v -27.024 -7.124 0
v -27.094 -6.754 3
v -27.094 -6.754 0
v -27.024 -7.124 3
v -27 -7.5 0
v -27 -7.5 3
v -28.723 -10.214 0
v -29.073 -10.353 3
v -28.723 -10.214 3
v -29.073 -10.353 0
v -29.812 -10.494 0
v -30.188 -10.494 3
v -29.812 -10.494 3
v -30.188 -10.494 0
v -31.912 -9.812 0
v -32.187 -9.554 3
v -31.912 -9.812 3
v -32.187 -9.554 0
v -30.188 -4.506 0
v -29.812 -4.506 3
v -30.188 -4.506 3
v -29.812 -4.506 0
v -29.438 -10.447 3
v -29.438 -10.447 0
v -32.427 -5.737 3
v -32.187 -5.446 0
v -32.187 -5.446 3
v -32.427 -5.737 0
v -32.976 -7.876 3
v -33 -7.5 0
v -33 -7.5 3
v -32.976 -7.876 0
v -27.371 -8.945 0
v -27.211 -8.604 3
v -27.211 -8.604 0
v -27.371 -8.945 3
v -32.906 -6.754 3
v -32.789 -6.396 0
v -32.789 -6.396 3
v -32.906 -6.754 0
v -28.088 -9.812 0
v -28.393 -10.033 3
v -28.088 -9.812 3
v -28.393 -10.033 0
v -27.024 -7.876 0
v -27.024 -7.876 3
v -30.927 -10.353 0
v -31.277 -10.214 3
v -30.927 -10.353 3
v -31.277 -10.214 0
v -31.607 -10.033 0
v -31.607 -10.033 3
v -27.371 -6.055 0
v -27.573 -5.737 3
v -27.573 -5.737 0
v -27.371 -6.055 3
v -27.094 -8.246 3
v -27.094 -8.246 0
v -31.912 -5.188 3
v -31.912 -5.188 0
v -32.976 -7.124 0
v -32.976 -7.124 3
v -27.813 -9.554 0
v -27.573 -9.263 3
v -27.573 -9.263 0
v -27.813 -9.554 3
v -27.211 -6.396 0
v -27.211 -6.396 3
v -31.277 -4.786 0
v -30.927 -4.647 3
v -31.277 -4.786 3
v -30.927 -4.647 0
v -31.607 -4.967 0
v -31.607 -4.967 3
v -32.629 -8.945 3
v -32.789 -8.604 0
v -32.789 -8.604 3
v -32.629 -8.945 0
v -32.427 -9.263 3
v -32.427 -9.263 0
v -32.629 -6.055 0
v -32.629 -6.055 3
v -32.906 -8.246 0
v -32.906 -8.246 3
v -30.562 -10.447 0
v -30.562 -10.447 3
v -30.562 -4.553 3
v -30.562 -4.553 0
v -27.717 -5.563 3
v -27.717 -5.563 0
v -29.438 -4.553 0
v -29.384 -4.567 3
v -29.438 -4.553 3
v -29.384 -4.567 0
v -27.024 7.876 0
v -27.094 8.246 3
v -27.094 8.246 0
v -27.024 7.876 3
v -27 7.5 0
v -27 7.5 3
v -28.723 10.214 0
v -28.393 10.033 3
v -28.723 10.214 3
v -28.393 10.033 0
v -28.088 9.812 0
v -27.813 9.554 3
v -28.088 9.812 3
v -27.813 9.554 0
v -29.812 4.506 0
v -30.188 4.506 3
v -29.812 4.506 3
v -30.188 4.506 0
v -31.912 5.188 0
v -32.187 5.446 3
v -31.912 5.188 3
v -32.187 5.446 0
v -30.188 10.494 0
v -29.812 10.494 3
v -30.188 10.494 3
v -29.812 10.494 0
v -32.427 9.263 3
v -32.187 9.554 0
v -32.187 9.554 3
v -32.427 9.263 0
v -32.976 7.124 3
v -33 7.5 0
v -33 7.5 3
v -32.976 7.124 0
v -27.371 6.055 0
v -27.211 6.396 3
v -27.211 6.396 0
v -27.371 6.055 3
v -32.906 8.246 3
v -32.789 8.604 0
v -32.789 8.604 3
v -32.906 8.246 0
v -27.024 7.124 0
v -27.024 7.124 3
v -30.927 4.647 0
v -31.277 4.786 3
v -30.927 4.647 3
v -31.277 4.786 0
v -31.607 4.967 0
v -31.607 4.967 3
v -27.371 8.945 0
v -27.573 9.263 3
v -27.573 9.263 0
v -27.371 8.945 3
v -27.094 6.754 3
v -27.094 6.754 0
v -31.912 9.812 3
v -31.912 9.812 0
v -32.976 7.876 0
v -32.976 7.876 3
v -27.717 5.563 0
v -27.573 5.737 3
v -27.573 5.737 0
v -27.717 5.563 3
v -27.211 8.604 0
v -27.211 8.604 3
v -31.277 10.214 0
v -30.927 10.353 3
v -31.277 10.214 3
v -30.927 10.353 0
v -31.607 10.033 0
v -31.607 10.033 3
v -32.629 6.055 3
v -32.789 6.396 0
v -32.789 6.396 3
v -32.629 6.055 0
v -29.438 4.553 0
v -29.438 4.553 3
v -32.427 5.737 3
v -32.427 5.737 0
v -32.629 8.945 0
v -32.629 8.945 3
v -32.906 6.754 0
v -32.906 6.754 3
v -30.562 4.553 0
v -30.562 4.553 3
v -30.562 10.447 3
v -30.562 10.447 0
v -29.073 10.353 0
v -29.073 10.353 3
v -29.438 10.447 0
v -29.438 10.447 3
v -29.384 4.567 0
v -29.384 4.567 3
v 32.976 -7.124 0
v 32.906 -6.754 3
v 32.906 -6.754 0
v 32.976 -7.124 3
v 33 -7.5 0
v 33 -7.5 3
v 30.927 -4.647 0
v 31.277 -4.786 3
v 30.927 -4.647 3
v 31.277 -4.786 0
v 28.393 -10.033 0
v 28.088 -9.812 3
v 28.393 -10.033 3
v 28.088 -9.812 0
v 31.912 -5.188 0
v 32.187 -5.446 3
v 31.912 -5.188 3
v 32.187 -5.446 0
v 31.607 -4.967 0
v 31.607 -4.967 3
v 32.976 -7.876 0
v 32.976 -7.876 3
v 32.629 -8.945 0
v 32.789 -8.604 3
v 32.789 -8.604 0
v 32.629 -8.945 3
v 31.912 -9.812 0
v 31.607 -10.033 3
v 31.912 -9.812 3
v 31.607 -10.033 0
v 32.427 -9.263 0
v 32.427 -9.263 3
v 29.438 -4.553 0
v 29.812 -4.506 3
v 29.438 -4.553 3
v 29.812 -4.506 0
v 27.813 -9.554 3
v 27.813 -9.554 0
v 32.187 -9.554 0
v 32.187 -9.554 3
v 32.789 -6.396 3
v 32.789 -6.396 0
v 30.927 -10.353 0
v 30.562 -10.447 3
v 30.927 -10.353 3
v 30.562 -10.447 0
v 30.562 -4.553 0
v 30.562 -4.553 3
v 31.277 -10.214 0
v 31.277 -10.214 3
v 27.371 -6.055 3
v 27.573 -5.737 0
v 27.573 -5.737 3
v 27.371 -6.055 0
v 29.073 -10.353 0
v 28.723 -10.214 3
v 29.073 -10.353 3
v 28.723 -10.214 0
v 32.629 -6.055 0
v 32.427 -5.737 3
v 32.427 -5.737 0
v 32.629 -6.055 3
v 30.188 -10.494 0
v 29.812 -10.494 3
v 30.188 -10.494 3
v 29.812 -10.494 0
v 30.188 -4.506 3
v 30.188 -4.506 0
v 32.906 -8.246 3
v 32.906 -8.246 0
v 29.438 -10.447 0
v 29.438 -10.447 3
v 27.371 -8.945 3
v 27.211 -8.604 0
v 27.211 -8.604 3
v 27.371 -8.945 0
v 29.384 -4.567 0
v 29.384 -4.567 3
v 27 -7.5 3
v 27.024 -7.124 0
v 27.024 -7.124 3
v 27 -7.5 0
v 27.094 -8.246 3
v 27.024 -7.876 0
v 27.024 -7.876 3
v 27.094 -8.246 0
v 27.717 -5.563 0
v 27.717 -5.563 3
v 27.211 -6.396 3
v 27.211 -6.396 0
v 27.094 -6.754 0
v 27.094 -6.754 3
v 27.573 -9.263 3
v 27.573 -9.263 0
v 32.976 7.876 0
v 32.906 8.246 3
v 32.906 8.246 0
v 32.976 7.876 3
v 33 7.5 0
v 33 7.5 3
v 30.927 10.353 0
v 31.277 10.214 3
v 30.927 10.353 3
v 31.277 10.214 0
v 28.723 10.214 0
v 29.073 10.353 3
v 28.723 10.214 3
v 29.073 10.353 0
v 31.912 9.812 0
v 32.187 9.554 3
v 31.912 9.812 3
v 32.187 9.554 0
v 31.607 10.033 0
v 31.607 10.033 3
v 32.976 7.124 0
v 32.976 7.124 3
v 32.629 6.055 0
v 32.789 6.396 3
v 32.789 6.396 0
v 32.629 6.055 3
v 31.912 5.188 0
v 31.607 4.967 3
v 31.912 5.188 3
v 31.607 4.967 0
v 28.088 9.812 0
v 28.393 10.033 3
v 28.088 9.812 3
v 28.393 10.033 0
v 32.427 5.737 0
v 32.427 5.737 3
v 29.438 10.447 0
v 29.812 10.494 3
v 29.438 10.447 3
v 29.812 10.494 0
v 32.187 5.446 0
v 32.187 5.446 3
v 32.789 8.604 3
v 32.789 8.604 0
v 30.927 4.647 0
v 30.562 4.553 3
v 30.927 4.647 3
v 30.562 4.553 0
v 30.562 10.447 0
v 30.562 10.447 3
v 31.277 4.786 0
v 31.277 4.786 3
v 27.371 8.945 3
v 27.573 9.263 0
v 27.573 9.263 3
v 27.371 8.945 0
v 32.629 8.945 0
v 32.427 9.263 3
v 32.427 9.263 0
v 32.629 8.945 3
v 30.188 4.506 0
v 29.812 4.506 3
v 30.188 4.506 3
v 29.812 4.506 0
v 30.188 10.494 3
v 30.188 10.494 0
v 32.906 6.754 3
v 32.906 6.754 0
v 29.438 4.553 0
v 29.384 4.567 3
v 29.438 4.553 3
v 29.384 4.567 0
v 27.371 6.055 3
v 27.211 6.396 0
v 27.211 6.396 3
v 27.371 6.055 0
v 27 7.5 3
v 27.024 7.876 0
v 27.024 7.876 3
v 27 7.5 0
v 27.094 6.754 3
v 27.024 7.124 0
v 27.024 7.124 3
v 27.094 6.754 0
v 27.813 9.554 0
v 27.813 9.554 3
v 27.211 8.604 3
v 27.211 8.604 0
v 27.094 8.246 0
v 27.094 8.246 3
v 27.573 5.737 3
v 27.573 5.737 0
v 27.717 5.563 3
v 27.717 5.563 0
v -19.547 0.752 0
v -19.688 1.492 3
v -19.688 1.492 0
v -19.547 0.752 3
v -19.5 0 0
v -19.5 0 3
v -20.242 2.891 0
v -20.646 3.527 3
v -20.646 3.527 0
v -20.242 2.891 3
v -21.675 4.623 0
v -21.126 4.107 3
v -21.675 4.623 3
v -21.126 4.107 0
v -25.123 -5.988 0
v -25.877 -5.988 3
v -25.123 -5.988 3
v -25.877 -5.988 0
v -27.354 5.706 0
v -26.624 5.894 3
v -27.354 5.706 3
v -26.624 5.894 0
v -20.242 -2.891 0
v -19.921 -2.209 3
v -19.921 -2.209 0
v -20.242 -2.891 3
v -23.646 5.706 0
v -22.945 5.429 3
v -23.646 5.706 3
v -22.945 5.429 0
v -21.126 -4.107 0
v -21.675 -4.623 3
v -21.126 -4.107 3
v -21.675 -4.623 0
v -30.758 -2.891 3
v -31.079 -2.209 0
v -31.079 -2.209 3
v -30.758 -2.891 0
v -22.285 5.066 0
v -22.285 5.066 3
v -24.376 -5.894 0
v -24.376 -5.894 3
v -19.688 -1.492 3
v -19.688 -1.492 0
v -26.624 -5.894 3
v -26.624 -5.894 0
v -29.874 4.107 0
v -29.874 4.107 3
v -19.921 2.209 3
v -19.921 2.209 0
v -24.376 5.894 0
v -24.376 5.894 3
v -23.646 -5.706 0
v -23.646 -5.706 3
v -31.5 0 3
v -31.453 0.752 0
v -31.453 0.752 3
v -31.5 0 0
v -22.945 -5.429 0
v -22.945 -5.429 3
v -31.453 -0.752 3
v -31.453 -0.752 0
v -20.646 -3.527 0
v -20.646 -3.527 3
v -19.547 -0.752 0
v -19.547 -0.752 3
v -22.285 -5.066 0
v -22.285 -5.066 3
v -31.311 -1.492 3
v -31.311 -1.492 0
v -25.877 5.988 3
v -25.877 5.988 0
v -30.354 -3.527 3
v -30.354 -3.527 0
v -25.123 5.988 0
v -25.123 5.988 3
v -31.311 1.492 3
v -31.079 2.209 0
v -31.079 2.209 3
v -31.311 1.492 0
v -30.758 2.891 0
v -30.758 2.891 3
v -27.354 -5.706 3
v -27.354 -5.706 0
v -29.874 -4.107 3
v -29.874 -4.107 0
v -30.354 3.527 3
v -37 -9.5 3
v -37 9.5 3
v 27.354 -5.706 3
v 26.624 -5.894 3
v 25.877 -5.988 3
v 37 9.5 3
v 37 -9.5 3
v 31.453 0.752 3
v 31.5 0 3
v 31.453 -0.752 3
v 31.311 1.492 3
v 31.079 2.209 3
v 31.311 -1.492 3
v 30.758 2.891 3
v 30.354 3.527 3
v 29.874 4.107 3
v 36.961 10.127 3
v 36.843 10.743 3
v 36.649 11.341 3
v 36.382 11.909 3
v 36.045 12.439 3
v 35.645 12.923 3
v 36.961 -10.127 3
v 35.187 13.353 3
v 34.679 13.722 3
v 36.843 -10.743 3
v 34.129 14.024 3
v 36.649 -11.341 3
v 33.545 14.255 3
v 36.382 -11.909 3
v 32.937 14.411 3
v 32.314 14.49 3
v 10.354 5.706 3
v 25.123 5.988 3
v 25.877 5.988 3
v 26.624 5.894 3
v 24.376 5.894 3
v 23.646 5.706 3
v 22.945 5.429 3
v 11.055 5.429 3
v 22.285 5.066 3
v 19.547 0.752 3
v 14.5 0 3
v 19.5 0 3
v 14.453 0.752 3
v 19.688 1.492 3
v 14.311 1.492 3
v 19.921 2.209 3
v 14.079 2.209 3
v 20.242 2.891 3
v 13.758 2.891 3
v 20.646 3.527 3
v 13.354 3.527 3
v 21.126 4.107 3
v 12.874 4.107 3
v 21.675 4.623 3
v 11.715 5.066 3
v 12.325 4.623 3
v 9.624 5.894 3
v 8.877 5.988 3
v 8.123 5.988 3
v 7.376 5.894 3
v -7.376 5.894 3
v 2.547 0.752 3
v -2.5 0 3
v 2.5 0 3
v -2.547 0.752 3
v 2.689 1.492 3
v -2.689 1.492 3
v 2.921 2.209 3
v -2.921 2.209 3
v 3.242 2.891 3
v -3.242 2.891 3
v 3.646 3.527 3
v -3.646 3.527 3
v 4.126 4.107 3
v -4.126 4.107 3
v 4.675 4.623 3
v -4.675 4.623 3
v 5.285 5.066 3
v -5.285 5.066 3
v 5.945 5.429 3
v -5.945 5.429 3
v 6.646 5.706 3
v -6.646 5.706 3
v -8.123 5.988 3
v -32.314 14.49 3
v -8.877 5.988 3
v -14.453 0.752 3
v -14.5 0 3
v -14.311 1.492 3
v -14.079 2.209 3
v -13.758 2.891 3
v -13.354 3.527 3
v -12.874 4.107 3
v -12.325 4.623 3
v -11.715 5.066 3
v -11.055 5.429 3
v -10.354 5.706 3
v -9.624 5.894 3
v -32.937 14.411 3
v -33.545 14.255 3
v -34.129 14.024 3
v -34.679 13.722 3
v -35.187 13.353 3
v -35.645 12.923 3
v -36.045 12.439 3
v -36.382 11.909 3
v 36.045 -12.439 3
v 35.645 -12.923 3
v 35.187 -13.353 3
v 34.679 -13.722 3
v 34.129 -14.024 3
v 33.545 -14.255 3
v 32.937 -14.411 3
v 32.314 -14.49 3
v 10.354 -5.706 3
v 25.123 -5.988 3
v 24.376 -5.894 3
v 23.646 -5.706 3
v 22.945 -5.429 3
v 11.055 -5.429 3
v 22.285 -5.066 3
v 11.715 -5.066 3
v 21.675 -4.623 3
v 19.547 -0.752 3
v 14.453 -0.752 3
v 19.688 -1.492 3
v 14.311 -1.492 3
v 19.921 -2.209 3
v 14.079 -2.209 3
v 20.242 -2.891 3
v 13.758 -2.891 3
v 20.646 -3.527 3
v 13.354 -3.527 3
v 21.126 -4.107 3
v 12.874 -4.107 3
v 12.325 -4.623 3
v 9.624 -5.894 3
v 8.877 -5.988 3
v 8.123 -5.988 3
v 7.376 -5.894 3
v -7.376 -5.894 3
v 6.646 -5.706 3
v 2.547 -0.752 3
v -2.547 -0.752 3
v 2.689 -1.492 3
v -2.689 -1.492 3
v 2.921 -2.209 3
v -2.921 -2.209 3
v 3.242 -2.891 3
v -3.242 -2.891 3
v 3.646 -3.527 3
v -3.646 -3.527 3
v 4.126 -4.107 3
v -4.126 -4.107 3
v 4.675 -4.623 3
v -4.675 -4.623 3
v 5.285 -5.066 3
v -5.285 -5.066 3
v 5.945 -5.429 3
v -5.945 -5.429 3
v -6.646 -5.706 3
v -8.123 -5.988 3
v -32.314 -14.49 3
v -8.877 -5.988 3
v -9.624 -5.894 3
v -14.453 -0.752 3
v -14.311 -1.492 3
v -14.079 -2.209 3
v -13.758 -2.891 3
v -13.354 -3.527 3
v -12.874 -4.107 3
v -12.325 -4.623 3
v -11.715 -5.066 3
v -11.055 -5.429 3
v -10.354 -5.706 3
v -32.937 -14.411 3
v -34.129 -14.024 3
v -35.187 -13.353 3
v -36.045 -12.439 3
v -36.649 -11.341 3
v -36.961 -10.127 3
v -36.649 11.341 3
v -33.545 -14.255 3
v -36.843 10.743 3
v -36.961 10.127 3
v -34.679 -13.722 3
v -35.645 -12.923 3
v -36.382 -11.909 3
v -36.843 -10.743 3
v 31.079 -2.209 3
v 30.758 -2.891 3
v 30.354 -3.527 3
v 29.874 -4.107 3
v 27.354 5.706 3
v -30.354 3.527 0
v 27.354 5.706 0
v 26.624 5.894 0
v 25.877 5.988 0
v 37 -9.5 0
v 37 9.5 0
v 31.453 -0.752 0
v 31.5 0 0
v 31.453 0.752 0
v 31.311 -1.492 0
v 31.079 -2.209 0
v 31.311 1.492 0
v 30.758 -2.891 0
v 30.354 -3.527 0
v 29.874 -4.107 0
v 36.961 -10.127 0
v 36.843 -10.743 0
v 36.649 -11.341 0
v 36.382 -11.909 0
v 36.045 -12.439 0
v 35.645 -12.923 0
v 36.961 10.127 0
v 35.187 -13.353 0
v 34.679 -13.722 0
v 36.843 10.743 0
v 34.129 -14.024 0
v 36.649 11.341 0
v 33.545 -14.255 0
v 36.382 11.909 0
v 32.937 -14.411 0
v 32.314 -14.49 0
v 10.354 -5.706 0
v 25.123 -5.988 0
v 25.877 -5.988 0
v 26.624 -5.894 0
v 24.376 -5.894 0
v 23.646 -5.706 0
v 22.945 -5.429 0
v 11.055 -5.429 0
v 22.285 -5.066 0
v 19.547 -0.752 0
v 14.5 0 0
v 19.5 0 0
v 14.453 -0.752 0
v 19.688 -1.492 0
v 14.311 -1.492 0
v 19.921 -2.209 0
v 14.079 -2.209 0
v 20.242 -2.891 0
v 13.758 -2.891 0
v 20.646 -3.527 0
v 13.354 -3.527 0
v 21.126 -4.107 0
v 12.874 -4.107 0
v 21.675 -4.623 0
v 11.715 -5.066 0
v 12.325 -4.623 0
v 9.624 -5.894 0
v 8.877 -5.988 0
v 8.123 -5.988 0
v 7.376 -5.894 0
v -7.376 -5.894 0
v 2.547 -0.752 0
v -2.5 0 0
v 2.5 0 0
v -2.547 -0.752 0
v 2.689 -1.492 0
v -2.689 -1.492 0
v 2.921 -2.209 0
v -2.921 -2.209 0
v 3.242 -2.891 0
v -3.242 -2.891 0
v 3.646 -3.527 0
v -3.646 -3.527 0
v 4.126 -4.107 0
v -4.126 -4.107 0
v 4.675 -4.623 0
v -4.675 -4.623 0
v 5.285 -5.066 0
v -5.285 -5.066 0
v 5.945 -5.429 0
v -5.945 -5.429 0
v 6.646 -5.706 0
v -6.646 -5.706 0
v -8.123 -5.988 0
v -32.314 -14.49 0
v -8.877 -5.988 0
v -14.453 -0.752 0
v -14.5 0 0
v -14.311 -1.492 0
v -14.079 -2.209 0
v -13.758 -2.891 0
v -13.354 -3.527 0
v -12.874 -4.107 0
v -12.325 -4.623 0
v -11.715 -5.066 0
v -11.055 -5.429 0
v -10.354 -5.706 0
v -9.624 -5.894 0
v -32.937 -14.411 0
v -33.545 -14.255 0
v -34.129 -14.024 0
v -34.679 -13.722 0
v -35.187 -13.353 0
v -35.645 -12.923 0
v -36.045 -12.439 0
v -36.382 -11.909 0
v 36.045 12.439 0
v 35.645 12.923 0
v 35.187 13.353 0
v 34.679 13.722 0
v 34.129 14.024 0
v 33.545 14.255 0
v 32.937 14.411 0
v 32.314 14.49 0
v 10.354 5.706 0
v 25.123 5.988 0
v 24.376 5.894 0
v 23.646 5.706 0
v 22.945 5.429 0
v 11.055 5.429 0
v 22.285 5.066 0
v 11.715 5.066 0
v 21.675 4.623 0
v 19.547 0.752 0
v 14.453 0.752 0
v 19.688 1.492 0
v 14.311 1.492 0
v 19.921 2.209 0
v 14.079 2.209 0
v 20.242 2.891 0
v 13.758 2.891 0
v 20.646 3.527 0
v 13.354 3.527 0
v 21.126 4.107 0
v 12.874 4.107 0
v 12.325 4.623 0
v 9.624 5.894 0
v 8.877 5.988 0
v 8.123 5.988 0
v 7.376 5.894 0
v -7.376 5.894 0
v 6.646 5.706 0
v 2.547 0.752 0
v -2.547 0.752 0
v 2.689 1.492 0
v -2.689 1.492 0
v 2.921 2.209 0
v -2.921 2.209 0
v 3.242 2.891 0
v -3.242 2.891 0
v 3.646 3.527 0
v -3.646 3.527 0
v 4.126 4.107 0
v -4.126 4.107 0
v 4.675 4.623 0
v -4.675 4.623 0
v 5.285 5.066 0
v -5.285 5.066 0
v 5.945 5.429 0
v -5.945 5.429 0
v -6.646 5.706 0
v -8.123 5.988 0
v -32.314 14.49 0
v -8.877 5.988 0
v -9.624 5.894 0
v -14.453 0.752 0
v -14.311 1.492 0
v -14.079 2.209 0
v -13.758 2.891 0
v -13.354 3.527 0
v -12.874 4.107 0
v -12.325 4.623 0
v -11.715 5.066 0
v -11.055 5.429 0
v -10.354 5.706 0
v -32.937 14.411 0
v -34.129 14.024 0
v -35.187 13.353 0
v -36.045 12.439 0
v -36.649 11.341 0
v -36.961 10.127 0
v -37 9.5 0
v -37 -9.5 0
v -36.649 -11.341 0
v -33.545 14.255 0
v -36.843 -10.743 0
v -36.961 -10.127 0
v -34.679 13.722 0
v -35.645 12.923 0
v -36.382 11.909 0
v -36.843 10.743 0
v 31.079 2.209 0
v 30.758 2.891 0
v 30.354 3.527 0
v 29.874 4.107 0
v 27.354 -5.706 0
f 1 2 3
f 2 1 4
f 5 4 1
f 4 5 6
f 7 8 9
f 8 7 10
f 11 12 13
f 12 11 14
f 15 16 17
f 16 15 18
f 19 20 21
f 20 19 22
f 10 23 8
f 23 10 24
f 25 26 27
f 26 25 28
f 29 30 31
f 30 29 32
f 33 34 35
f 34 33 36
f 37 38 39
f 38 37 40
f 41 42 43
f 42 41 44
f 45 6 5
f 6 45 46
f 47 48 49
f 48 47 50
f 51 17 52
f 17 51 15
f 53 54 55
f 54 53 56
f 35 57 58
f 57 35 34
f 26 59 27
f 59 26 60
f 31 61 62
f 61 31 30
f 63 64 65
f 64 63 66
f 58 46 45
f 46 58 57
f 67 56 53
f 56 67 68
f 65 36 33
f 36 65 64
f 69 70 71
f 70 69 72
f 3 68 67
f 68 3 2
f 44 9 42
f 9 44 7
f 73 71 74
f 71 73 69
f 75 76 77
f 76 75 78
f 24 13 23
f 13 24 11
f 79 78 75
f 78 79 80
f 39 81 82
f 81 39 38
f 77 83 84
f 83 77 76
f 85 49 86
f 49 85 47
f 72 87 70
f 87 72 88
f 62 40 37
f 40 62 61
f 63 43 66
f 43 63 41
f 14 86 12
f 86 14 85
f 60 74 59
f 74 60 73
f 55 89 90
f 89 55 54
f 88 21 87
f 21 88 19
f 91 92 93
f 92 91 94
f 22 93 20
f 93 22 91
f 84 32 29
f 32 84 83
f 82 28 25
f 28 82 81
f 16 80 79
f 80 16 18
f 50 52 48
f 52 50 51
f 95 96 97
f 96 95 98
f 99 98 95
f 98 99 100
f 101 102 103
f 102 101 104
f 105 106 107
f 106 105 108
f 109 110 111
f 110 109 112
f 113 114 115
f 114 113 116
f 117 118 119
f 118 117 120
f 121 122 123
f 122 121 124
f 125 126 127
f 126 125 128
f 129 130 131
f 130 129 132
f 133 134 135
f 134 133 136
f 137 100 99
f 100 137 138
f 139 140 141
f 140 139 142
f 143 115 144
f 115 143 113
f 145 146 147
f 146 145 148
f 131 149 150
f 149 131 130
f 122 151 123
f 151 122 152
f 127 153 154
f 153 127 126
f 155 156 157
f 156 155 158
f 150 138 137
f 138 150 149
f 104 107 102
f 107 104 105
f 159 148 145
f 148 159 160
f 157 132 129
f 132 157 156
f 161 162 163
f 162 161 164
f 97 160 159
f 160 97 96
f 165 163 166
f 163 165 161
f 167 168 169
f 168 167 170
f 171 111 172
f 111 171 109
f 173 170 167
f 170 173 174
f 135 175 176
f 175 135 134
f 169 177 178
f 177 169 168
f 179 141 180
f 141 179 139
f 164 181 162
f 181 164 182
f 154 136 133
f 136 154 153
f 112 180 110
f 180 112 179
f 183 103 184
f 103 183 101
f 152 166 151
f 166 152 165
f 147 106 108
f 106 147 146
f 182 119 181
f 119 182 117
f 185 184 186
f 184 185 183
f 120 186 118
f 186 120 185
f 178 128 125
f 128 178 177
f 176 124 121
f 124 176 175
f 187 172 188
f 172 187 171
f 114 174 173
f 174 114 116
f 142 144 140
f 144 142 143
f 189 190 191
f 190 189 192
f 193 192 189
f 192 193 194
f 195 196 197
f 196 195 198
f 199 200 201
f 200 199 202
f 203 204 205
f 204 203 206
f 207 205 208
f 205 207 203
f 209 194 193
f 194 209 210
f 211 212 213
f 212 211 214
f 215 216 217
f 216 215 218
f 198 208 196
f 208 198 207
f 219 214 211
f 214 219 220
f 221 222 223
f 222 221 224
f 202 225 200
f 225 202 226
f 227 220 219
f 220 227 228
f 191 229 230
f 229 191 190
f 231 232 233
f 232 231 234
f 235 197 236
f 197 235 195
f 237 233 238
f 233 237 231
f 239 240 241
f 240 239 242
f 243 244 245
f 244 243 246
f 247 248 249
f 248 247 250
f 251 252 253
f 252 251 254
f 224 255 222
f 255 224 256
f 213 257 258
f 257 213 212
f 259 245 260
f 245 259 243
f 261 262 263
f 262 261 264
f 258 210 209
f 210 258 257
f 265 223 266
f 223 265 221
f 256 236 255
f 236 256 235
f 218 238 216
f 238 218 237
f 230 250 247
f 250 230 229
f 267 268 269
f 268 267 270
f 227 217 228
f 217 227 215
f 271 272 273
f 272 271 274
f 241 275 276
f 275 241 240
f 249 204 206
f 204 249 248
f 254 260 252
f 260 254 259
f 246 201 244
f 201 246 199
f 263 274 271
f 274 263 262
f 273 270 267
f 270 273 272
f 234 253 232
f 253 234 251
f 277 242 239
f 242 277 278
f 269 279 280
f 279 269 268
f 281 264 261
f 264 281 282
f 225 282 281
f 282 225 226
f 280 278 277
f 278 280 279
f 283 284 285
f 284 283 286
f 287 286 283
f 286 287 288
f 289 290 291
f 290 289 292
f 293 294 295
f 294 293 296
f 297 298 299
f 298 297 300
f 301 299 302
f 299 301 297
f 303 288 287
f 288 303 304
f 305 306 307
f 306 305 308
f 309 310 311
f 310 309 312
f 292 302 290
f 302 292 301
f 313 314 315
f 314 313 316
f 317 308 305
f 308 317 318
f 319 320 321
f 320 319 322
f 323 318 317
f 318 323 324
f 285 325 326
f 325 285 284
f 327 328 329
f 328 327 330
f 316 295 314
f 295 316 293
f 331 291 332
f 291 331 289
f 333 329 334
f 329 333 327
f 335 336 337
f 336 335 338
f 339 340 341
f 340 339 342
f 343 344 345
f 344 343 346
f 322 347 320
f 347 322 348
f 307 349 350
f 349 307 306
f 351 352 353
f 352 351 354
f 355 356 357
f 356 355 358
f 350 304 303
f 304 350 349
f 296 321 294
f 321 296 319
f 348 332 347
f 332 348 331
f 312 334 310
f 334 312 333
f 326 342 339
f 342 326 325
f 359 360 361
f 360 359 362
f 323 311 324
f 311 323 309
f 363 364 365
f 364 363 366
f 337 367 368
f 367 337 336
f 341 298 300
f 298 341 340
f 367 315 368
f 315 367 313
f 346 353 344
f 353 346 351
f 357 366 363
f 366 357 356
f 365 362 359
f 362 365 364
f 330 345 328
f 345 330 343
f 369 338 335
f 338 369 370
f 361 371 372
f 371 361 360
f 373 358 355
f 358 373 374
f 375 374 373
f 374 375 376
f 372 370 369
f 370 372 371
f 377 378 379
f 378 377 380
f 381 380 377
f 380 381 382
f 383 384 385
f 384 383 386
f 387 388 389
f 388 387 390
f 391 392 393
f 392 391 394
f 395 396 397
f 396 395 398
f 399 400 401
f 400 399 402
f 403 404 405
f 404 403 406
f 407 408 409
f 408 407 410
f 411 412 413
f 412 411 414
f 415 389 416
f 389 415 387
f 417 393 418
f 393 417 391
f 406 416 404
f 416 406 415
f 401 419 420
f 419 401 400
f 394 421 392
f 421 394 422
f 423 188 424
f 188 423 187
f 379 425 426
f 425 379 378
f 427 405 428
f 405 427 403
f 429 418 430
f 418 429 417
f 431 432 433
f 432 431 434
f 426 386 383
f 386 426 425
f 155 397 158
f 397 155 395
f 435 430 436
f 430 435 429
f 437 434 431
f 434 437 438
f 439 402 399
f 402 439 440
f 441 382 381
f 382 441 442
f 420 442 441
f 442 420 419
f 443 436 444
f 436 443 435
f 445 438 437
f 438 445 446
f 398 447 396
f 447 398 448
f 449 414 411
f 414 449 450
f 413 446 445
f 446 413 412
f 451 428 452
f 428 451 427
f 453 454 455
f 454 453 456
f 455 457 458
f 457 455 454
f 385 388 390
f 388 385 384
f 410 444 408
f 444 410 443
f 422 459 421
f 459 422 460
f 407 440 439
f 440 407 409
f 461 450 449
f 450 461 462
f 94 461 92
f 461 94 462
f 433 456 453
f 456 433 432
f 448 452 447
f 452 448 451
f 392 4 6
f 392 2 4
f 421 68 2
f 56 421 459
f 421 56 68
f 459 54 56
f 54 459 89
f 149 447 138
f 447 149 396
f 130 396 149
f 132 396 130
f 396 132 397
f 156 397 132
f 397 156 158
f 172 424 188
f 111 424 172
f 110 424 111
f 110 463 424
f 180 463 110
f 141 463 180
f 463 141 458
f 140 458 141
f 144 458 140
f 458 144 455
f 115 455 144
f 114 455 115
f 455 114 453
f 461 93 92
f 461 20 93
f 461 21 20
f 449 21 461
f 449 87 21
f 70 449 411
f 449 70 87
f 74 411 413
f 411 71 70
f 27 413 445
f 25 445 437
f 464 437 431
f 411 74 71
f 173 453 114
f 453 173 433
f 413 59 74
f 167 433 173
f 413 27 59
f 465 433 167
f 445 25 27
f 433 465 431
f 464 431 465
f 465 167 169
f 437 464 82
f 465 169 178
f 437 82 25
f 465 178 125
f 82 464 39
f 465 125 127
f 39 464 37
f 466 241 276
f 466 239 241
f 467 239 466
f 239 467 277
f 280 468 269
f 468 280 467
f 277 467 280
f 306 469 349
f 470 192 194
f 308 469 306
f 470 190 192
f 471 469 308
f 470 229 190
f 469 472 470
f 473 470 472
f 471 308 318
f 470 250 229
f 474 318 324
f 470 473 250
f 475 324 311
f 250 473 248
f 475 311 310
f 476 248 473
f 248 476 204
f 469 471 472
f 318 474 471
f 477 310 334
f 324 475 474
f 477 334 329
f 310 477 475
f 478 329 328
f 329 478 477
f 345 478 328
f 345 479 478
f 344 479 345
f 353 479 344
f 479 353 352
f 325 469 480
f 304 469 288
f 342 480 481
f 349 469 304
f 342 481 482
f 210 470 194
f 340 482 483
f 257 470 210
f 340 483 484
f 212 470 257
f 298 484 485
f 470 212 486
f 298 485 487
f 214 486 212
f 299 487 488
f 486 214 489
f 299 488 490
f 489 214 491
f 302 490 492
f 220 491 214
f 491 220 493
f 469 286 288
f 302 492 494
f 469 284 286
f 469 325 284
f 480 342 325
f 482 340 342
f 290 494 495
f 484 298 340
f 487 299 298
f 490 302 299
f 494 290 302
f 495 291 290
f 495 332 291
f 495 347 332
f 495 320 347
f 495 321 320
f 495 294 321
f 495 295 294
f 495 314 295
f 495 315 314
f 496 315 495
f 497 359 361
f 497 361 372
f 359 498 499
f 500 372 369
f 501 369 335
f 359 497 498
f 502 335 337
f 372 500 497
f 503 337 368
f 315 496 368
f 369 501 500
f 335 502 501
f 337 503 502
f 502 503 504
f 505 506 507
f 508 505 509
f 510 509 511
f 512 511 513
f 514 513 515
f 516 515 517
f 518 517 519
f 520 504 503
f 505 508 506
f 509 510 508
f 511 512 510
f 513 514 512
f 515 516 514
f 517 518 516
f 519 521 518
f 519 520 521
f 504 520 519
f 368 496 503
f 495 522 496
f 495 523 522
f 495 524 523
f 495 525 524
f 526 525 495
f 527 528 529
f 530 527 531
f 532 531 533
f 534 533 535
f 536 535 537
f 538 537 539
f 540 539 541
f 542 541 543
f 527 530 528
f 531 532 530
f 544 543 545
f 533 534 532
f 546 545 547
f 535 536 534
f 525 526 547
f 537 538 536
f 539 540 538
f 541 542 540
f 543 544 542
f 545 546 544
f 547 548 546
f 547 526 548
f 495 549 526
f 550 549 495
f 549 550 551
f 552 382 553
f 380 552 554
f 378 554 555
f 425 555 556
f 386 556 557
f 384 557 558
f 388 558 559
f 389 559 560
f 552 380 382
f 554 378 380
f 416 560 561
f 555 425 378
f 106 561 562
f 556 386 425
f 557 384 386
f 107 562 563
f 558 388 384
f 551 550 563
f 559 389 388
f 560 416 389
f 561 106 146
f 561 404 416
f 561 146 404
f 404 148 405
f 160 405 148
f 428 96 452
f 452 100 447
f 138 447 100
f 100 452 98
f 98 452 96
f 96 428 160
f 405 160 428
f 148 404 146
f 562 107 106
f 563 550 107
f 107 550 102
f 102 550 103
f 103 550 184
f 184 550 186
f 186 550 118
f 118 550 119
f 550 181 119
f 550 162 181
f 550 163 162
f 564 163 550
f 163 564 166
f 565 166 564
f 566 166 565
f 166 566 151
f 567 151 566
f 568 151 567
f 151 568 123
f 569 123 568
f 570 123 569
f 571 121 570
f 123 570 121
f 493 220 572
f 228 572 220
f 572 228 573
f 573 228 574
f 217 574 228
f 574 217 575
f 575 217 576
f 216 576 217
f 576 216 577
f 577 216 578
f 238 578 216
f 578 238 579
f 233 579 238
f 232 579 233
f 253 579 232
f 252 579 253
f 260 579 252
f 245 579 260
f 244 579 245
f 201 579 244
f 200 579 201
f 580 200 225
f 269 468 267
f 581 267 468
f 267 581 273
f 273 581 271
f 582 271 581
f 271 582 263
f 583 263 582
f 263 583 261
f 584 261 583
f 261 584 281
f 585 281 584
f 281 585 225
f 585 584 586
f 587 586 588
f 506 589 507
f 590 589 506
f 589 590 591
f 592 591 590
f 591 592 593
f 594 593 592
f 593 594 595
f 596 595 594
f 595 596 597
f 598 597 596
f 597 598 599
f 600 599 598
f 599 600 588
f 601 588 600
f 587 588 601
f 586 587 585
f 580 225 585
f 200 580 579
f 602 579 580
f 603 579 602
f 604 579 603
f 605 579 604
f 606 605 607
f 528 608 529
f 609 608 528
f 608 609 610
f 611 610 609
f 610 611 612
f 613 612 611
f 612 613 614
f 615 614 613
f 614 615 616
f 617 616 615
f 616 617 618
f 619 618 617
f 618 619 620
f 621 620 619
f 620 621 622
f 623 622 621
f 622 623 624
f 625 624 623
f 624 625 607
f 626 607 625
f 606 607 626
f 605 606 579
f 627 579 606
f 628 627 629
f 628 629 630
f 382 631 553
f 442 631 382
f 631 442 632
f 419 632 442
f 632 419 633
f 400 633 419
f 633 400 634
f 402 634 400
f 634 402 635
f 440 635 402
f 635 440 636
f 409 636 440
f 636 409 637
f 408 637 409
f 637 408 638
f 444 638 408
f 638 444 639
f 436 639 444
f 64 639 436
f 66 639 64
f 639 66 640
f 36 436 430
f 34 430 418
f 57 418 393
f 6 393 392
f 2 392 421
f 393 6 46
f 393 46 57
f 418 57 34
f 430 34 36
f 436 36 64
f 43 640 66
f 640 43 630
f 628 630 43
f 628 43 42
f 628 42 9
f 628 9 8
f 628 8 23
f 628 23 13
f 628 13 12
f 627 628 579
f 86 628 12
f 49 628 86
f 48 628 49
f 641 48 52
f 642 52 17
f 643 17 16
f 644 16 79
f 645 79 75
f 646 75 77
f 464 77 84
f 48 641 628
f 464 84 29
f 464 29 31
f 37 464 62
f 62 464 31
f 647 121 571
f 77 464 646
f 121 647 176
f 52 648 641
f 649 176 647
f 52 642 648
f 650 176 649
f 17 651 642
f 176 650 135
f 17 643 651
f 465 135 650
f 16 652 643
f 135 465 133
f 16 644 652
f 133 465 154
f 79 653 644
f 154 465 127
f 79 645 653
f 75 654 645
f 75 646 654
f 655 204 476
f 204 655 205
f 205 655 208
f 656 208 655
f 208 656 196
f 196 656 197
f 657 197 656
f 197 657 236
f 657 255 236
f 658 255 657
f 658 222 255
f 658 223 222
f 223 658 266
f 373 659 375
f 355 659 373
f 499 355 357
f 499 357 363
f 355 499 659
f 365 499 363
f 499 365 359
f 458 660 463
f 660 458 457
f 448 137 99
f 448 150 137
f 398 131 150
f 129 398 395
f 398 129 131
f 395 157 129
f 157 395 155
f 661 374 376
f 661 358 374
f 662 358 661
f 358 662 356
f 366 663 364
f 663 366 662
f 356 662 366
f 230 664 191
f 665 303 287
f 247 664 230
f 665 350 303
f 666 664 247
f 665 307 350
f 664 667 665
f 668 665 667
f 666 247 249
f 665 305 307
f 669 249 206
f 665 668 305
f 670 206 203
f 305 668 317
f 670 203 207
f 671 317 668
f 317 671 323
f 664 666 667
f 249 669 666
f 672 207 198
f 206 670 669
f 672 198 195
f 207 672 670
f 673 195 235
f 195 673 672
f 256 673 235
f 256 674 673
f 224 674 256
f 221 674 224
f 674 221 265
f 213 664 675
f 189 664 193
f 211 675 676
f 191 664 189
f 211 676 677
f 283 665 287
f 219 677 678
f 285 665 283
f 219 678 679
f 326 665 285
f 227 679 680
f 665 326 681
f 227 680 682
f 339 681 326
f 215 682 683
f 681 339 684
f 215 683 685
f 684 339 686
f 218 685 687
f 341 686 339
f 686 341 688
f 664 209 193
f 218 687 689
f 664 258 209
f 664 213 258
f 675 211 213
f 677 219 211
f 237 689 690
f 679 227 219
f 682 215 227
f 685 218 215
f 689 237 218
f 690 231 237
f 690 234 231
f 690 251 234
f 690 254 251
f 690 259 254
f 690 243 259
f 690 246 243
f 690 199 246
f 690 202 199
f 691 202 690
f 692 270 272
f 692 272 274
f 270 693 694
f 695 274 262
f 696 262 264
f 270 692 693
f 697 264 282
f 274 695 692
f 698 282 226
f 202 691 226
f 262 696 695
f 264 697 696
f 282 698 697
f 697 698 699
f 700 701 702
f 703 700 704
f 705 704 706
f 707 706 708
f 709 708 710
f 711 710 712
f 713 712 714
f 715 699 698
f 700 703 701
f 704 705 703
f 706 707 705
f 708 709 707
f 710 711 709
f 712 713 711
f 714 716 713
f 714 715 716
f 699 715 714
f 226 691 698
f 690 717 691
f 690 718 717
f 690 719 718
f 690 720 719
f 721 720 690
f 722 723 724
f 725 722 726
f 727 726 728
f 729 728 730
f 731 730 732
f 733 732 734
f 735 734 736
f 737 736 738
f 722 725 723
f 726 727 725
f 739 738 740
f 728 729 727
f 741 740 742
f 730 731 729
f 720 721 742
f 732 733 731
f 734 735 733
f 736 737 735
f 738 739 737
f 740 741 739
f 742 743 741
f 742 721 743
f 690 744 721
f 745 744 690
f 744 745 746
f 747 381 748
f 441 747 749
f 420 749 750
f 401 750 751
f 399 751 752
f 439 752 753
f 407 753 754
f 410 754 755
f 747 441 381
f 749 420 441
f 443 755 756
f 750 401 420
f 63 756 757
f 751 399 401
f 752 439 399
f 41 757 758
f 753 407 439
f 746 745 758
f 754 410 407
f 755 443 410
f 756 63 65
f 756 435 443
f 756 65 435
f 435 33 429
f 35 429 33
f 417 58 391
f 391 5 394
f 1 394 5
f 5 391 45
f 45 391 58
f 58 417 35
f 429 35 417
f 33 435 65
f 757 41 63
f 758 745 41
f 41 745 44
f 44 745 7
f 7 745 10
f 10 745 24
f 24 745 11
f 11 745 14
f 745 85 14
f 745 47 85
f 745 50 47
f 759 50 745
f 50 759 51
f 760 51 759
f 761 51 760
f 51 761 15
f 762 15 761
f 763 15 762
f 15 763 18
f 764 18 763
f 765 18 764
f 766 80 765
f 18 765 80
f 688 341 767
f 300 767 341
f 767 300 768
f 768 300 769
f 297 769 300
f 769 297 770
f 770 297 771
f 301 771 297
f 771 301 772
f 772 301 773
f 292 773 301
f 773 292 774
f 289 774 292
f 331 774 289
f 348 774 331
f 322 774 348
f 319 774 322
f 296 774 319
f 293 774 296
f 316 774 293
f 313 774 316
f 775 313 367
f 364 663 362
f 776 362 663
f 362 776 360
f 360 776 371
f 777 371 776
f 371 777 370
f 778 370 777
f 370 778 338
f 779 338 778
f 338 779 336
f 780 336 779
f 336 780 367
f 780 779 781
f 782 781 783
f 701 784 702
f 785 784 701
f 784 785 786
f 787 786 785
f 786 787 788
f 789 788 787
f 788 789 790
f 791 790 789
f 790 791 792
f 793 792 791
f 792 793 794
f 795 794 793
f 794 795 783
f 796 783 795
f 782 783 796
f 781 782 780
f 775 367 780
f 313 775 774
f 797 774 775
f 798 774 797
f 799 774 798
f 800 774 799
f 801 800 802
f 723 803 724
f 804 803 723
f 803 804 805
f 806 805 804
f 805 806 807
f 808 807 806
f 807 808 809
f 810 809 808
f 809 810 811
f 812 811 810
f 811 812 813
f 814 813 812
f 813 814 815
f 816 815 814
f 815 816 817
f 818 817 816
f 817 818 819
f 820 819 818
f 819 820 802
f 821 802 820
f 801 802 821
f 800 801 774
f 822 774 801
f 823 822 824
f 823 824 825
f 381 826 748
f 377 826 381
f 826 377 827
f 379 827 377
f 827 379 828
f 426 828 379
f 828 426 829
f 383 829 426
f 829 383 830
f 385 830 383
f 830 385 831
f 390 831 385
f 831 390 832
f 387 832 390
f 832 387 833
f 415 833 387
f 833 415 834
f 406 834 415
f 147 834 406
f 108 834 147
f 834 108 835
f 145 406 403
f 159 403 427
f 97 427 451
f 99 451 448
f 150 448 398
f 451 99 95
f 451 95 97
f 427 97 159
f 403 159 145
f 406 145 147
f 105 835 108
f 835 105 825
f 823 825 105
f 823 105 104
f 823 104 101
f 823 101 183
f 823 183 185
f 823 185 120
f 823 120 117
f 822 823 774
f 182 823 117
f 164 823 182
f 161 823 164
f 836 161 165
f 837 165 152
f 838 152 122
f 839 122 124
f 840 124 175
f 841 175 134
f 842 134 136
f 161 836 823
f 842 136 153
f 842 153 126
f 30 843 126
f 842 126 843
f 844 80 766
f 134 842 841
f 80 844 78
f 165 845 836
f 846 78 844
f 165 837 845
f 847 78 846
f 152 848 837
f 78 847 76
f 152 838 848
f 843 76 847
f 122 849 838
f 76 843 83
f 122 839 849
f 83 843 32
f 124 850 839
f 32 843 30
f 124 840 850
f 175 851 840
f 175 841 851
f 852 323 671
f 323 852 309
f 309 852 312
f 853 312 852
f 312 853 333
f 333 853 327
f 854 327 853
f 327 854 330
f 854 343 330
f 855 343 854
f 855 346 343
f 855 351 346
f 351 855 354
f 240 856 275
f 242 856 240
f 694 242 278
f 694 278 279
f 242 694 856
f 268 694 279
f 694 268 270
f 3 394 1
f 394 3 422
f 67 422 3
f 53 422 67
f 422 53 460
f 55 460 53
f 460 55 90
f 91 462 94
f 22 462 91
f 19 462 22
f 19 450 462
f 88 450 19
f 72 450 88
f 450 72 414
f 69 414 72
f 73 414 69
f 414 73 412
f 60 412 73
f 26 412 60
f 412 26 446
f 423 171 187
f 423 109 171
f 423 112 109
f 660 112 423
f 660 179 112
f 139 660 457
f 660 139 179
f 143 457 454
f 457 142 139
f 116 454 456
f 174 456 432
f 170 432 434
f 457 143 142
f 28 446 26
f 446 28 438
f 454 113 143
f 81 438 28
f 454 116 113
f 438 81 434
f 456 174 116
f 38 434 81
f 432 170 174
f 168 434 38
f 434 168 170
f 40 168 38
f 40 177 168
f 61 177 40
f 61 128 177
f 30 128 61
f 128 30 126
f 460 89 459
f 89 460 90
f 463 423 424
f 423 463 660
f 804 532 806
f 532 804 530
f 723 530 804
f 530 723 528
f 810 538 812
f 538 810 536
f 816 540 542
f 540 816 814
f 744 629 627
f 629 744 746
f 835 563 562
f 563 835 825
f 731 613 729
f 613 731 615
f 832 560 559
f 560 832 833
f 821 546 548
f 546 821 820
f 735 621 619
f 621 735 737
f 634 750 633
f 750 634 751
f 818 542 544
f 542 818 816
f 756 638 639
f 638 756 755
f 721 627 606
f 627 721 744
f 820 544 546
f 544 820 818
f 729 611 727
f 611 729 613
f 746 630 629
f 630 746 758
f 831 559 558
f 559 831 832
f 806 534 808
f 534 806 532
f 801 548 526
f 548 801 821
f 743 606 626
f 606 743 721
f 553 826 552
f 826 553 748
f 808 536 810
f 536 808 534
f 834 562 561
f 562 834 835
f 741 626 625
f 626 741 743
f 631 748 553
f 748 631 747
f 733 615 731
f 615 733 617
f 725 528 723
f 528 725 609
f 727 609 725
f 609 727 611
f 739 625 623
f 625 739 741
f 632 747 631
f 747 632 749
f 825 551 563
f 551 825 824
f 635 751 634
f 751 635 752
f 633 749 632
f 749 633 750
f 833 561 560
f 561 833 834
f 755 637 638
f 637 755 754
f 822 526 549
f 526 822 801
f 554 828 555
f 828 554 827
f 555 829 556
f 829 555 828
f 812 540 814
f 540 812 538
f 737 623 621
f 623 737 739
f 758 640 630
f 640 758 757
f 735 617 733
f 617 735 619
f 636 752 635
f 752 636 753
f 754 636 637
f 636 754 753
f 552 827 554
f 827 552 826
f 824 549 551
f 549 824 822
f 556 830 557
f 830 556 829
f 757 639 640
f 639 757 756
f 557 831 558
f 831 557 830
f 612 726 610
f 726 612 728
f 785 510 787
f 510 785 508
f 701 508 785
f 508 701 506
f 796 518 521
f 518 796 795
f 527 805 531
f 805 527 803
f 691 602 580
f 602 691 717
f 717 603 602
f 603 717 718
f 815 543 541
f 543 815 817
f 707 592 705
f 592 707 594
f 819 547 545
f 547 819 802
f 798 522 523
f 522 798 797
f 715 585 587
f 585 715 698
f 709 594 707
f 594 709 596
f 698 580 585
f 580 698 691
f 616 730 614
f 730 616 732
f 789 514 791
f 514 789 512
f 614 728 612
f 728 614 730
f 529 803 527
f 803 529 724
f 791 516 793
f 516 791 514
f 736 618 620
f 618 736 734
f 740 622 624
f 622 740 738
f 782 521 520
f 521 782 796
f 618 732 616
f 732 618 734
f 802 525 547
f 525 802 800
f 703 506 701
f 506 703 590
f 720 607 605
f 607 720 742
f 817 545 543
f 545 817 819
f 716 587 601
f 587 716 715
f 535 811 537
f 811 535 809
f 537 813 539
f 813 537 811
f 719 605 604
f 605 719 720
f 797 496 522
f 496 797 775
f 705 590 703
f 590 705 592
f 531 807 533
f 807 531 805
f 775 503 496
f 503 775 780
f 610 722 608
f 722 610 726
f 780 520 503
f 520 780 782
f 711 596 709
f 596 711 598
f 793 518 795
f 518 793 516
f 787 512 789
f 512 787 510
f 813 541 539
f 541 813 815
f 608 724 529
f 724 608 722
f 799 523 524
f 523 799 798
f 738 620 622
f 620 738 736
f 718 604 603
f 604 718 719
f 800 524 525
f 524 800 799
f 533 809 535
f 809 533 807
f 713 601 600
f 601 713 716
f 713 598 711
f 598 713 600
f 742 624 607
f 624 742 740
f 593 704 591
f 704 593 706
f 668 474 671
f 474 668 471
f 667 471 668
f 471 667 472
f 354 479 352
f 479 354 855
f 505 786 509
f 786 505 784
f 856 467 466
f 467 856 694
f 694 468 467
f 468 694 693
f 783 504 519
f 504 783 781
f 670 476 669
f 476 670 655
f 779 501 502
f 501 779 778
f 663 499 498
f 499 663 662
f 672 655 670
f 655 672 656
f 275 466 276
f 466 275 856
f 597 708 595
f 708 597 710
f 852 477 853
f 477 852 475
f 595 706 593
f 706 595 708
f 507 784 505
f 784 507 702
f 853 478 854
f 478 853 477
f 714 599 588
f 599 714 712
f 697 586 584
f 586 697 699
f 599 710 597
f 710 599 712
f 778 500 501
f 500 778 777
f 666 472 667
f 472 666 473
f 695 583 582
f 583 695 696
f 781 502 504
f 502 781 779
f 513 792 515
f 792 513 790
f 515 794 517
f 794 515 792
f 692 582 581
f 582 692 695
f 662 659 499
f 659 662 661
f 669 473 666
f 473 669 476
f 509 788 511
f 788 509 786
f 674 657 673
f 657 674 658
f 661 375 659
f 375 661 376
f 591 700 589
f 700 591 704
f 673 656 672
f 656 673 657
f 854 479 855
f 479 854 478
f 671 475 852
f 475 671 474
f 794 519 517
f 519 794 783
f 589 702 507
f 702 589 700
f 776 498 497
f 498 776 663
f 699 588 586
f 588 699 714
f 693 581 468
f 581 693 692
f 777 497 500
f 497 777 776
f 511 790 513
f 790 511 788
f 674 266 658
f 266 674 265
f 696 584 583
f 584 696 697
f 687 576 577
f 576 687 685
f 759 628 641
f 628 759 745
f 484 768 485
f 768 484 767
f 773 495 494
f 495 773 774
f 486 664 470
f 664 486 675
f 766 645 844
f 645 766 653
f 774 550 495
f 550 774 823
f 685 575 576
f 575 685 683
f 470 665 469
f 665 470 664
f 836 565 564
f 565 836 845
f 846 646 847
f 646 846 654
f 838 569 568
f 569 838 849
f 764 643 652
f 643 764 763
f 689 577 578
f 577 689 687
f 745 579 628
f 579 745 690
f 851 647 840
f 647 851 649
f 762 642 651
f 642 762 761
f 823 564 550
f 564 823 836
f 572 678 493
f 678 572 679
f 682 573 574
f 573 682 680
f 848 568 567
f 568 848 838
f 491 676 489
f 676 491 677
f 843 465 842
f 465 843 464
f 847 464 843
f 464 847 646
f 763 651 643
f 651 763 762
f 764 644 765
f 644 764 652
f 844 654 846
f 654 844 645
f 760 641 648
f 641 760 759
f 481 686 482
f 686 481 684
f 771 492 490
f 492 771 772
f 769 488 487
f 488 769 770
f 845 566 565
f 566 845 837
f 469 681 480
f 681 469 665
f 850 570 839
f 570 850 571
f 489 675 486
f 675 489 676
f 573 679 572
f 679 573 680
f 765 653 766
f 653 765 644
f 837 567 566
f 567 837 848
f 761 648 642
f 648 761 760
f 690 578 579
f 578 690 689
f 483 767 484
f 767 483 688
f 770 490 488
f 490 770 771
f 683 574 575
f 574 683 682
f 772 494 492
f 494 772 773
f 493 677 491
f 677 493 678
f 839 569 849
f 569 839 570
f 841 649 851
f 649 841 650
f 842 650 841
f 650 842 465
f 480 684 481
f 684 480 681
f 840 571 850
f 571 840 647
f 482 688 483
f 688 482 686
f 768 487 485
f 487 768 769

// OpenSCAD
$fn = 50;


difference() {
	union() {
		hull() {
			translate(v = [-32.0000000000, 9.5000000000, 0]) {
				cylinder(h = 3, r = 5);
			}
			translate(v = [32.0000000000, 9.5000000000, 0]) {
				cylinder(h = 3, r = 5);
			}
			translate(v = [-32.0000000000, -9.5000000000, 0]) {
				cylinder(h = 3, r = 5);
			}
			translate(v = [32.0000000000, -9.5000000000, 0]) {
				cylinder(h = 3, r = 5);
			}
		}
	}
	union() {
		#translate(v = [-30.0000000000, -7.5000000000, -100.0000000000]) {
			cylinder(h = 200, r = 3.0000000000);
		}
		#translate(v = [-30.0000000000, 7.5000000000, -100.0000000000]) {
			cylinder(h = 200, r = 3.0000000000);
		}
		#translate(v = [30.0000000000, -7.5000000000, -100.0000000000]) {
			cylinder(h = 200, r = 3.0000000000);
		}
		#translate(v = [30.0000000000, 7.5000000000, -100.0000000000]) {
			cylinder(h = 200, r = 3.0000000000);
		}
		#translate(v = [-25.5000000000, 0, 0]) {
			cylinder(h = 3, r = 6.0000000000);
		}
		#translate(v = [-8.5000000000, 0, 0]) {
			cylinder(h = 3, r = 6.0000000000);
		}
		#translate(v = [8.5000000000, 0, 0]) {
			cylinder(h = 3, r = 6.0000000000);
		}
		#translate(v = [25.5000000000, 0, 0]) {
			cylinder(h = 3, r = 6.0000000000);
		}
	}
}
